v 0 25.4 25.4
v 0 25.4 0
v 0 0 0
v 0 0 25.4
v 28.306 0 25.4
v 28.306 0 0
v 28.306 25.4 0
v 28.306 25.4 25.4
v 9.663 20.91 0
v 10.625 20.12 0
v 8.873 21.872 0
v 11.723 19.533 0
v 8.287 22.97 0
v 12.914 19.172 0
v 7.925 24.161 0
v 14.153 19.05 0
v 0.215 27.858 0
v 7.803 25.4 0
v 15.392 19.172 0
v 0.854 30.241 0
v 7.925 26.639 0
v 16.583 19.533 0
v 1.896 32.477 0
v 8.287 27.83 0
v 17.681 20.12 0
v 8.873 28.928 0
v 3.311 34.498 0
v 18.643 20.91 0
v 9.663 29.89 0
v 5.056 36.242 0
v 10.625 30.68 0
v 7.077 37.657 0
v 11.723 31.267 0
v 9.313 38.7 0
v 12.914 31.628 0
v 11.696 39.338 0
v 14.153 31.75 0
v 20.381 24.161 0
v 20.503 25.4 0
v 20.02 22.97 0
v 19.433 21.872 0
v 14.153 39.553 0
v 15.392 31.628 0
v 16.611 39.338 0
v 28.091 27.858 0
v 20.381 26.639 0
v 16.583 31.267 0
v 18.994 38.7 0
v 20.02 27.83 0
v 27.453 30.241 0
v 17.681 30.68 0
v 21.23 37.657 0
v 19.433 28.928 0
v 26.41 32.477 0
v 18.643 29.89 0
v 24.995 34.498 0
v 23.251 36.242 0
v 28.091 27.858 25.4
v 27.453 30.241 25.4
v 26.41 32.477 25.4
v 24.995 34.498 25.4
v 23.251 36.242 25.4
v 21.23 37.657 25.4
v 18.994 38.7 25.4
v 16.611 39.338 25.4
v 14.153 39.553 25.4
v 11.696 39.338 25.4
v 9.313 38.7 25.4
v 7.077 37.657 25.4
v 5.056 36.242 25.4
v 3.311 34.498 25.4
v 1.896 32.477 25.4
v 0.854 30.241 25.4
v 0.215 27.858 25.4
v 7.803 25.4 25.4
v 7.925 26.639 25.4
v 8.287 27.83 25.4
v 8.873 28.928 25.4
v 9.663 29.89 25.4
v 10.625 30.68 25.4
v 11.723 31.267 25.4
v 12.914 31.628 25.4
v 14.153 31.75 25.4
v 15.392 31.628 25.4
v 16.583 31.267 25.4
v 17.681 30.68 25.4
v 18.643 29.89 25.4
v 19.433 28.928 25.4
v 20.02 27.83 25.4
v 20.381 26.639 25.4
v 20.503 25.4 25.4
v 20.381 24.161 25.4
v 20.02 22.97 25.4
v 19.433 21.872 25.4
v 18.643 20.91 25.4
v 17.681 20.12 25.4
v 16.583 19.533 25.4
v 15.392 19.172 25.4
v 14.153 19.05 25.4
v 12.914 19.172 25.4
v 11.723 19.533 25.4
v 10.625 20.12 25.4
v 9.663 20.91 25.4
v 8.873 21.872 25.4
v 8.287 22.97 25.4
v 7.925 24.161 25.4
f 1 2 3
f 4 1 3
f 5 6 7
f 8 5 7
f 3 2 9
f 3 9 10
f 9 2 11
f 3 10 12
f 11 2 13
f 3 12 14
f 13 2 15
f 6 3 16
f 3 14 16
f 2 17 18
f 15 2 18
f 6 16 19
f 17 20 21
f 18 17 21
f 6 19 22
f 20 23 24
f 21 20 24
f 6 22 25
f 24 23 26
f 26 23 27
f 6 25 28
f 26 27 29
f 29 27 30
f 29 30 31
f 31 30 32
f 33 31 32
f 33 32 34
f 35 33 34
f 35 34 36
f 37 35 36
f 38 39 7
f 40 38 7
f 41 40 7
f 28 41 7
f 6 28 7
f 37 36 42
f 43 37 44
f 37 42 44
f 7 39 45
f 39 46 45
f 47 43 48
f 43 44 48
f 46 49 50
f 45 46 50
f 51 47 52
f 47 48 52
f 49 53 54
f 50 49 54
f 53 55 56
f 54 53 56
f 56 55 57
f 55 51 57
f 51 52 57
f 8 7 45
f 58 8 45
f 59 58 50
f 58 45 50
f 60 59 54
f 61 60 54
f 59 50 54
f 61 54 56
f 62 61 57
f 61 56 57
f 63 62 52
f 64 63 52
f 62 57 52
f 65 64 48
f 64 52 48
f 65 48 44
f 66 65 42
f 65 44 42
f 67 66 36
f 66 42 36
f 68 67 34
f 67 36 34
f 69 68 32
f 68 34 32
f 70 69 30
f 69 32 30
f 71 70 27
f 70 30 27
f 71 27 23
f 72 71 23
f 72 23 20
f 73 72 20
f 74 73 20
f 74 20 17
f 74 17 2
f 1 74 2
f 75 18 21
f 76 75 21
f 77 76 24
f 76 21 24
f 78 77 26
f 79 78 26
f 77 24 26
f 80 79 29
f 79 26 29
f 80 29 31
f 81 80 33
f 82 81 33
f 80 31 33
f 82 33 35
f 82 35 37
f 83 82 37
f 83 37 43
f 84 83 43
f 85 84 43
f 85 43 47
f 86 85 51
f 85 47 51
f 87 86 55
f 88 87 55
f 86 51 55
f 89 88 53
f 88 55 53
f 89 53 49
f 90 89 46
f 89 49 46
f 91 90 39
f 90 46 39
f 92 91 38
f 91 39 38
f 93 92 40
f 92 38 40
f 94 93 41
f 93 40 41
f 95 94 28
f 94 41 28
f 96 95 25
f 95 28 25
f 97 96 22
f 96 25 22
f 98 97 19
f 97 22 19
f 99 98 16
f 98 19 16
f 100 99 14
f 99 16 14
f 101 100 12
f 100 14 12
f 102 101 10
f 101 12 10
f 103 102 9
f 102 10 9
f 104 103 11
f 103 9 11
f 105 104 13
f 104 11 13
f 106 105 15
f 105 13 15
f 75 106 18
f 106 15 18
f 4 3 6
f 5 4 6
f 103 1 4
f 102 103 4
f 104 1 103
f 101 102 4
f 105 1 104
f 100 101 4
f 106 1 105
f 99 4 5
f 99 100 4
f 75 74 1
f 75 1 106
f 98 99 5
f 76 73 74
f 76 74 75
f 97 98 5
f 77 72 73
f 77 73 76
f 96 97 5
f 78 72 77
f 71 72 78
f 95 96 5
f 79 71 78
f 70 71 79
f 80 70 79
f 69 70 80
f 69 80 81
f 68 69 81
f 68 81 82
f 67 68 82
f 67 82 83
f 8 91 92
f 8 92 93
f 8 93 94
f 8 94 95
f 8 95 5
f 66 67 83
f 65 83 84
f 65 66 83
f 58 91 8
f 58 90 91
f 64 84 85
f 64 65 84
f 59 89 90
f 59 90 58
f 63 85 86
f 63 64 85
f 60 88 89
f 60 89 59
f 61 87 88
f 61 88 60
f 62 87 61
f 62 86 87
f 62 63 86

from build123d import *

# Parameters (mm, degrees)
F1_DEPTH = 25.4


with BuildPart() as f1:
    # F0 (on Top) → F1 (new body)
    with BuildSketch(Plane.XY):
        with BuildLine():
            Line((0, 25.4), (0, 0))
            Line((0, 0), (28.306466, 0))
            Line((28.306466, 0), (28.306466, 25.4))
            Line((28.306466, 25.4), (20.503233, 25.4))
            ThreePointArc((20.503233, 25.4), (14.153233, 19.05), (7.803233, 25.4))
            Line((7.803233, 25.4), (0, 25.4))
        make_face()
        with BuildLine():
            ThreePointArc((28.306466, 25.4), (14.153233, 39.553233), (0, 25.4))
            Line((0, 25.4), (7.803233, 25.4))
            ThreePointArc((7.803233, 25.4), (14.153233, 31.75), (20.503233, 25.4))
            Line((20.503233, 25.4), (28.306466, 25.4))
        make_face()
    extrude(amount=F1_DEPTH)


solid = f1.part
